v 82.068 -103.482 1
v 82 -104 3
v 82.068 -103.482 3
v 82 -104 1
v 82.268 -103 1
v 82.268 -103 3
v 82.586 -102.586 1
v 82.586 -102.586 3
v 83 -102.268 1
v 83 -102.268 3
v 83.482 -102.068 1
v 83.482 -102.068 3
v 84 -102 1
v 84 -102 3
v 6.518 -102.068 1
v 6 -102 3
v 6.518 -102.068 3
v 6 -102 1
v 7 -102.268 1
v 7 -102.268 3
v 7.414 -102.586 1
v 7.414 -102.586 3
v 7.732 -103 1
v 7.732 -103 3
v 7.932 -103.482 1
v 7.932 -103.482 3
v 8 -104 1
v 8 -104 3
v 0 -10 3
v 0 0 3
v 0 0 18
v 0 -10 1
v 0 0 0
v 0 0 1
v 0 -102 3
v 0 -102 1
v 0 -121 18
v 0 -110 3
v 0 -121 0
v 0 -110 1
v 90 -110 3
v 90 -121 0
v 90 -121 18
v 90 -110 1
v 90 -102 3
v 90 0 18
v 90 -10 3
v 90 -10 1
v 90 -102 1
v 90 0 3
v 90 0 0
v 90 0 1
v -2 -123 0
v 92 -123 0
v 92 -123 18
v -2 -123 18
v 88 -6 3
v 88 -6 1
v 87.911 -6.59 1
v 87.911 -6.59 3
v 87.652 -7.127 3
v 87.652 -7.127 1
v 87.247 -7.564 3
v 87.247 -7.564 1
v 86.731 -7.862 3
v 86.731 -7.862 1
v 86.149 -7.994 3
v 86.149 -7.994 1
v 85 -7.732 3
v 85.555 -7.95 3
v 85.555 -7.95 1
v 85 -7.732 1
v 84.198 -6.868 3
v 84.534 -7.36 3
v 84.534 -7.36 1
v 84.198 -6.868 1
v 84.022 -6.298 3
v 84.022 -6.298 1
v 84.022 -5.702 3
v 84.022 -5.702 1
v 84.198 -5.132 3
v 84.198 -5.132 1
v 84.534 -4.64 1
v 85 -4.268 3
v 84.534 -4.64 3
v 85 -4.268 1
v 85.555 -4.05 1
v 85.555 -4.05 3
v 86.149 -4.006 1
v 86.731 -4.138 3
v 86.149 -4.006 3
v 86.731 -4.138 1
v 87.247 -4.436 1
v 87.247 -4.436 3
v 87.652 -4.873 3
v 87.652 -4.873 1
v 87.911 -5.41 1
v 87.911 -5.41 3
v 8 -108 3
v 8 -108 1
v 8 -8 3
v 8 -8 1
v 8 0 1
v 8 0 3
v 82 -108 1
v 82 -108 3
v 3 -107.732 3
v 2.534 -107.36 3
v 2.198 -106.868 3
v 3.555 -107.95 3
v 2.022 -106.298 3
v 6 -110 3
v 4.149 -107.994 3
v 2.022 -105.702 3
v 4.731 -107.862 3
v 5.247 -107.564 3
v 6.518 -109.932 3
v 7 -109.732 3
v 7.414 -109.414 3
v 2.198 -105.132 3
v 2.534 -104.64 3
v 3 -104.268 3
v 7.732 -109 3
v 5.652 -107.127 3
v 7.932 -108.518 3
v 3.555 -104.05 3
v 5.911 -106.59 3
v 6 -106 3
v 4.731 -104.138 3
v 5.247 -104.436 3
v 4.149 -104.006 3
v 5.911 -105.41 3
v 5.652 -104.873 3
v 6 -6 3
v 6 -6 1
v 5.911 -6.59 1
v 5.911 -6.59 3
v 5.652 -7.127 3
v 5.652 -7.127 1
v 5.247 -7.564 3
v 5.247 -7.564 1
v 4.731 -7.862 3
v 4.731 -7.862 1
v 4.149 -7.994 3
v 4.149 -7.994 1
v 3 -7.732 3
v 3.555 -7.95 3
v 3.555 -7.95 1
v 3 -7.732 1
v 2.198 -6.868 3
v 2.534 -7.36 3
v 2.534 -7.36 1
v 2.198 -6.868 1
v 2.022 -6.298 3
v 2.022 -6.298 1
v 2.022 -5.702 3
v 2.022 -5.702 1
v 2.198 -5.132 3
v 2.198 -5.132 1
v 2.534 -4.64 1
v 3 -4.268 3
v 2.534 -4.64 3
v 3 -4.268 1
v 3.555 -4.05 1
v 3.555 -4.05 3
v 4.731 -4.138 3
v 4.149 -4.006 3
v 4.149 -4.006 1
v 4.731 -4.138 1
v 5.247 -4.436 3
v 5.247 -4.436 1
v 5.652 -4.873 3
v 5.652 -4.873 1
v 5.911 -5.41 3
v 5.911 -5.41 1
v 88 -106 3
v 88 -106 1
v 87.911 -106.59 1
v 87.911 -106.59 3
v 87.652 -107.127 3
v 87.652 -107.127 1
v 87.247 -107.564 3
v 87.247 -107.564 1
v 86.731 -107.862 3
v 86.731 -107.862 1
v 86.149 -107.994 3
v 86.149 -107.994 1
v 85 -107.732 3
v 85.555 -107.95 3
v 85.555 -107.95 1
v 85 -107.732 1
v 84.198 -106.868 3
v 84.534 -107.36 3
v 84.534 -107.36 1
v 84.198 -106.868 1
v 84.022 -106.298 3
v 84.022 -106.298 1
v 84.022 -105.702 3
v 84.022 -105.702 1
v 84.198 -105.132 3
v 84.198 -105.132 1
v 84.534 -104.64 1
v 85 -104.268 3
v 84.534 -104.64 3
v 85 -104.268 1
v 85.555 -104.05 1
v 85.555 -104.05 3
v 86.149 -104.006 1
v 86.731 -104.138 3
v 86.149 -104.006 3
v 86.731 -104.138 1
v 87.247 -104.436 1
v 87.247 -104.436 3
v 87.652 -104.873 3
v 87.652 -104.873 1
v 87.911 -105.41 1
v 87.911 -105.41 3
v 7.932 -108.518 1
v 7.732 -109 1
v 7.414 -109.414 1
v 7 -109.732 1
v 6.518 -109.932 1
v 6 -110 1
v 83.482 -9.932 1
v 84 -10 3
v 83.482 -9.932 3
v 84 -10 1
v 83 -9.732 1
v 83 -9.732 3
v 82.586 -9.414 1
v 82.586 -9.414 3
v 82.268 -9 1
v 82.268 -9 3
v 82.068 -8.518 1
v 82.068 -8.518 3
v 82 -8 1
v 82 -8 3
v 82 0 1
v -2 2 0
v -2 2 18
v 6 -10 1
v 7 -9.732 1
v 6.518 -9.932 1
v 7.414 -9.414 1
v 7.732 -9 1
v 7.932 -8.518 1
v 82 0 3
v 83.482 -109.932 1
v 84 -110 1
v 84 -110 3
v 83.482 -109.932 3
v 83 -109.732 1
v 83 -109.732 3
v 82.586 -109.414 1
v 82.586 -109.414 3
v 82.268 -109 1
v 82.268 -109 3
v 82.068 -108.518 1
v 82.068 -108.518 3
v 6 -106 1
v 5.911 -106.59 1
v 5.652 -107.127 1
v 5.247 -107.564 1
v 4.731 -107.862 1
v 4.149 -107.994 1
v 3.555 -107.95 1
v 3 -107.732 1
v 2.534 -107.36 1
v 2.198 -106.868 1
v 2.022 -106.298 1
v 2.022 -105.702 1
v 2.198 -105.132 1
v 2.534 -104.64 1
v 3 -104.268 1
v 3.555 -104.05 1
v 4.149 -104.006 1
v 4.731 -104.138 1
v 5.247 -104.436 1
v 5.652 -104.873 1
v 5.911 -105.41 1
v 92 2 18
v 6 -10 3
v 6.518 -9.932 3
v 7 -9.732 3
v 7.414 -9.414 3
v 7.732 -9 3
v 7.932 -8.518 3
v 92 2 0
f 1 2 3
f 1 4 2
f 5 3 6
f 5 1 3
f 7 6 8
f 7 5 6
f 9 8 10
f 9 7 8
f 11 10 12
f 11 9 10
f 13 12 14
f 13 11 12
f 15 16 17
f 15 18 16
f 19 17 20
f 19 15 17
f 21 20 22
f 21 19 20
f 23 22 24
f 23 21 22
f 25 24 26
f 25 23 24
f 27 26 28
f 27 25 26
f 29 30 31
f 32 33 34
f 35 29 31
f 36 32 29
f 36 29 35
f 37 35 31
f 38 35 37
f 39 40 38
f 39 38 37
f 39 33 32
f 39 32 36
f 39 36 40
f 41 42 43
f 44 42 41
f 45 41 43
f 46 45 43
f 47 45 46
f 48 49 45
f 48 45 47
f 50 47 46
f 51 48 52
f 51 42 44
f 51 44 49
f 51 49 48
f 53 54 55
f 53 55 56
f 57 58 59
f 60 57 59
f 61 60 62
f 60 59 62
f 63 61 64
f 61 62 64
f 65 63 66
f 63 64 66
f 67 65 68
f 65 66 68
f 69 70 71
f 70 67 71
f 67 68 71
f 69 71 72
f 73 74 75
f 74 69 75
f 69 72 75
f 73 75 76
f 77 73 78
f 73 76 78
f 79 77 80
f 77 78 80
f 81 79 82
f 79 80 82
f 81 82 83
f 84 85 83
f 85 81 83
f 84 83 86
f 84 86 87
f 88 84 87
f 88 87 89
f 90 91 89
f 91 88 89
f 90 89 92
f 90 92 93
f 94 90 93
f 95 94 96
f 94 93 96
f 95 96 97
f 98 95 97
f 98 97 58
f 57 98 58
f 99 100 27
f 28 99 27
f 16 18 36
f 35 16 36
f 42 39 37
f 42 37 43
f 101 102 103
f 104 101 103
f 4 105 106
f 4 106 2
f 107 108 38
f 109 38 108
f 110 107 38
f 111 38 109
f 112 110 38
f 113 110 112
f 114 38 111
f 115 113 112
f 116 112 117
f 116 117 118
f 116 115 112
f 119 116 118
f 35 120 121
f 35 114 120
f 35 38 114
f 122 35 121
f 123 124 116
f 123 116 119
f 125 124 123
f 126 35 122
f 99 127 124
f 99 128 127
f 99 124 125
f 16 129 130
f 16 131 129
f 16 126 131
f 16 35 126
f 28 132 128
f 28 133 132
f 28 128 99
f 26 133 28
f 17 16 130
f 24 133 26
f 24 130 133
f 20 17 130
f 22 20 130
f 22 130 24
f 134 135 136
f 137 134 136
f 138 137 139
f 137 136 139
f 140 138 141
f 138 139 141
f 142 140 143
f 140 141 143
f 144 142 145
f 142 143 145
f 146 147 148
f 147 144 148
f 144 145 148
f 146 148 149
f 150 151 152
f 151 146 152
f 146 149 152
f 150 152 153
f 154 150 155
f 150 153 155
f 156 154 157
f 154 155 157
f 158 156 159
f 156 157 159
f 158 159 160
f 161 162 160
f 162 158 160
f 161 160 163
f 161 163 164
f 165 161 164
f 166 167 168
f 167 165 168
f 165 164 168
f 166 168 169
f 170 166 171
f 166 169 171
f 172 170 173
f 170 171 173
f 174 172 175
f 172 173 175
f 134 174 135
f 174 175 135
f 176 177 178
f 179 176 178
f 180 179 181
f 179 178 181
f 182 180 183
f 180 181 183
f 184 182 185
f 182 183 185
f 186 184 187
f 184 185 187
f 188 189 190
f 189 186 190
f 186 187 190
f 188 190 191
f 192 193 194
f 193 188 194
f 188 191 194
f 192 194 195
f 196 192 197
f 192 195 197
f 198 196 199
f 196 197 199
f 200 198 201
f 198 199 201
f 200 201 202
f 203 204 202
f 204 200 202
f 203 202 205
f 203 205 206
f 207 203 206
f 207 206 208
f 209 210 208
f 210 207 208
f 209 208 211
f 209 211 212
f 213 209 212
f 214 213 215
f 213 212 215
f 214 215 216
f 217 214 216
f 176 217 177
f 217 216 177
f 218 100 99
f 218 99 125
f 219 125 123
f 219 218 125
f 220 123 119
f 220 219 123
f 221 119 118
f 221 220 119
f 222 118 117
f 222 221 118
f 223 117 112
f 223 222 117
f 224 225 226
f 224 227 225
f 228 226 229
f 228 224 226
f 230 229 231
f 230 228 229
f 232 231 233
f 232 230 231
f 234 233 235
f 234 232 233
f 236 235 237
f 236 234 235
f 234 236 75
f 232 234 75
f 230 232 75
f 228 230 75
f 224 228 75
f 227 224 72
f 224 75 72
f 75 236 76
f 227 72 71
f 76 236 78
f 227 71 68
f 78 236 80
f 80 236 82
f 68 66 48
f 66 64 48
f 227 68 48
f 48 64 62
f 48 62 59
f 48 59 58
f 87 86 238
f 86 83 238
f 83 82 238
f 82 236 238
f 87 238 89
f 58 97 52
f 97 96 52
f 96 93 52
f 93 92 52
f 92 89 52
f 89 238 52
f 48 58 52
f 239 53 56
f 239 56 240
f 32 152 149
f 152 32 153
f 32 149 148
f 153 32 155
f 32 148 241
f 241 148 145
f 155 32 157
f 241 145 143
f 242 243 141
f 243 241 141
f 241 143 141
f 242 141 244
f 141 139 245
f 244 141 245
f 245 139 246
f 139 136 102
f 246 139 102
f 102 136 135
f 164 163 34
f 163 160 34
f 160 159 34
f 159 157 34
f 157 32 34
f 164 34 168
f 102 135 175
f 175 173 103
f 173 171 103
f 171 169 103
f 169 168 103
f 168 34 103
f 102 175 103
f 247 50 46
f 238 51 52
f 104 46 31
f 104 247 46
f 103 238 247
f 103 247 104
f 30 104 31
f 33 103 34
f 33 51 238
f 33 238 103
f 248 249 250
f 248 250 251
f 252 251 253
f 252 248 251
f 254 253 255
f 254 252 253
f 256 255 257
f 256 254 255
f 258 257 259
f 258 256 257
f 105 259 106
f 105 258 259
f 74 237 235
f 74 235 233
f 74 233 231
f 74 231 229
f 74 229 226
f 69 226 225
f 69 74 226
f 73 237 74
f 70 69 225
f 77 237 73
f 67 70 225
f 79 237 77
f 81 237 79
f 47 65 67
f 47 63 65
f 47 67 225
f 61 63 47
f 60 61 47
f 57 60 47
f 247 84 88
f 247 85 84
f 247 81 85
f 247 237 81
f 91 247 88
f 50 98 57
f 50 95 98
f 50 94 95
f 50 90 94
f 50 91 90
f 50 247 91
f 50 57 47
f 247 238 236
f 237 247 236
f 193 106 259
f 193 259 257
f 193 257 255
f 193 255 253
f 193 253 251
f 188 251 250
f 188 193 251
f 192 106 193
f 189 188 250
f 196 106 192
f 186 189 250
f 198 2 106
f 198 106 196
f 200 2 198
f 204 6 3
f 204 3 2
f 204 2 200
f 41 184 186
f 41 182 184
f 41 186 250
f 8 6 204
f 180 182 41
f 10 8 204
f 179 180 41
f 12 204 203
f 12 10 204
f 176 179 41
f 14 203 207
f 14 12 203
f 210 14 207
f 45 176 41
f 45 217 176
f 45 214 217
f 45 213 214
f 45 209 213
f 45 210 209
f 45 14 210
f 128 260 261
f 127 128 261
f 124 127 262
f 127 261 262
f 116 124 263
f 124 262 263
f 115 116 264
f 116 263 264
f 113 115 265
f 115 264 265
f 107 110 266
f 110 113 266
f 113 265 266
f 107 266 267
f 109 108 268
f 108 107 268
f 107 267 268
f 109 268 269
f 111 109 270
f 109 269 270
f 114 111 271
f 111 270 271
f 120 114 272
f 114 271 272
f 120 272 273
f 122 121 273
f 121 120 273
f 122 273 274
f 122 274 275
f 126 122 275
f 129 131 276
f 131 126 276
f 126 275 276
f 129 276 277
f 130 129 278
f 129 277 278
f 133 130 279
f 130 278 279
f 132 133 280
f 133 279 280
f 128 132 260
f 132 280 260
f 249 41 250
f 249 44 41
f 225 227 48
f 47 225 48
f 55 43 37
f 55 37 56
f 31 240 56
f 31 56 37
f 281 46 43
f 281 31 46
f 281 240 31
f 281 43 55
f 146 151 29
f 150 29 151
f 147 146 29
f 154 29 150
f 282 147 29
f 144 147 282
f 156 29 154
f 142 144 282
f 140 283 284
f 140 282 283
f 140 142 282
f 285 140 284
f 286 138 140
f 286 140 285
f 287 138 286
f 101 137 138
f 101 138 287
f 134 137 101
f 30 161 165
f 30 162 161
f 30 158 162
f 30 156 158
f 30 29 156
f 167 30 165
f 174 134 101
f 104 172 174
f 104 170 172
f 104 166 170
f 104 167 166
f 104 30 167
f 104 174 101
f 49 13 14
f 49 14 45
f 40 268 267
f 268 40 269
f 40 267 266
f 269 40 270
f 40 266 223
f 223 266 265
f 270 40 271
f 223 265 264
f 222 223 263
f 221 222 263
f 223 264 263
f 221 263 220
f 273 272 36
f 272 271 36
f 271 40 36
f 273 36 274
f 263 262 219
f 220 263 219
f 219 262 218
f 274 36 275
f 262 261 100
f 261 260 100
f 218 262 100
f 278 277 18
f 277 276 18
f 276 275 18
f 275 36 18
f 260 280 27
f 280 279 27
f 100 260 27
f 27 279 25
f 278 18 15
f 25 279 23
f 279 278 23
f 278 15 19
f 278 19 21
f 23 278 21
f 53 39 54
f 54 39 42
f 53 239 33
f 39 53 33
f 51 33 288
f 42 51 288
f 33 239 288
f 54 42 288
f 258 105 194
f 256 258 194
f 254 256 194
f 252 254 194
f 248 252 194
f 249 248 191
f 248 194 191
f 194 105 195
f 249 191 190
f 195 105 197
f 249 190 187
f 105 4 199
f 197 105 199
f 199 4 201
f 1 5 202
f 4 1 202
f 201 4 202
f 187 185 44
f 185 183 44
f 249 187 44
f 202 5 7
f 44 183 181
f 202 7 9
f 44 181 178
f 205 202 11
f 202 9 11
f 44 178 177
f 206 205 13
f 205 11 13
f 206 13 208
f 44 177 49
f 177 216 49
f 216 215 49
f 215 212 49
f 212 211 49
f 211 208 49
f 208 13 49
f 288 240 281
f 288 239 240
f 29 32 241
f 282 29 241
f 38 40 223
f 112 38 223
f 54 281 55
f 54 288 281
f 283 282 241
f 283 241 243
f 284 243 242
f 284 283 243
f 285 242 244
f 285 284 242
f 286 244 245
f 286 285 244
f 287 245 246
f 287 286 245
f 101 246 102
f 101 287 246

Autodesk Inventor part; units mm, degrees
ref_plane "YZ Plane" through (0, 0, 0) normal (1, 0, 0) x (0, 1, 0)
ref_plane "XZ Plane" through (0, 0, 0) normal (0, 1, 0) x (-1, 0, 0)
ref_plane "XY Plane" through (0, 0, 0) normal (0, 0, 1) x (1, 0, 0)
sketch "Schizzo1" plane through (0, 0, 0) normal (0, 0, 1) x (1, 0, 0)
  point P0 (0, 0)
sketch "Schizzo2" plane through (0, 0, 0) normal (0, 0, 1) x (1, 0, 0)
  line L0 (0, -121) -> (90, -121) projected
  line L1 (90, -121) -> (90, 0) projected
  line L2 (0, 0) -> (0, -121) projected
  line L3 (90, 0) -> (0, 0) projected
  circle A0 centre (86, -106) radius 2 projected
  circle A1 centre (4, -106) radius 2 projected
  circle A2 centre (4, -6) radius 2 projected
  circle A3 centre (86, -6) radius 2 projected
  line L4 (92, 2) -> (92, -123)
  line L5 (92, -123) -> (-2, -123)
  line L6 (-2, -123) -> (-2, 2)
  line L7 (-2, 2) -> (92, 2)
  dimension "d0" = 2
extrude "Estrusione1" add sketch "Schizzo2" along normal blind 18 contours L4 L5 L6 L7
ref_plane "Piano di lavoro1" through (45, -60.5, 1) normal (0, 0, 1) x (1, 0, 0)
sketch "Schizzo3" plane through (45, -60.5, 1) normal (0, 0, 1) x (1, 0, 0)
  circle A0 centre (41, -45.5) radius 2 projected
  circle A1 centre (-41, -45.5) radius 2 projected
  circle A2 centre (41, 54.5) radius 2 projected
  circle A3 centre (-41, 54.5) radius 2 projected
  line L0 (45, -60.5) -> (45, 60.5) projected
  line L1 (45, 60.5) -> (-45, 60.5) projected
  line L2 (-45, -60.5) -> (45, -60.5) projected
  line L3 (-45, 60.5) -> (-45, -60.5) projected
  line L4 (-45, -60.5) -> (-45, 60.5) projected
  line L5 (-39, -41.5) -> (-45, -41.5)
  line L6 (-45, -41.5) -> (-45, -49.5)
  line L7 (-45, -49.5) -> (-39, -49.5)
  line L8 (-37, -47.5) -> (-37, -43.5)
  arc A4 (-37, -43.5) -> (-39, -41.5) centre (-39, -43.5) ccw
  arc A5 (-39, -49.5) -> (-37, -47.5) centre (-39, -47.5) ccw
  line L9 (39, -41.5) -> (45, -41.5)
  line L10 (45, -41.5) -> (45, -49.5)
  line L11 (45, -49.5) -> (39, -49.5)
  line L12 (37, -47.5) -> (37, -43.5)
  arc A6 (37, -47.5) -> (39, -49.5) centre (39, -47.5) ccw
  arc A7 (39, -41.5) -> (37, -43.5) centre (39, -43.5) ccw
  line L13 (37, 60.5) -> (37, 52.5)
  line L14 (39, 50.5) -> (45, 50.5)
  line L15 (45, 50.5) -> (45, 60.5)
  arc A8 (37, 52.5) -> (39, 50.5) centre (39, 52.5) ccw
  line L16 (-45, 60.5) -> (-45, 50.5)
  line L17 (-45, 50.5) -> (-37, 50.5)
  line L18 (-37, 50.5) -> (-37, 60.5)
  point P0 (-45, -41.5)
  point P1 (-45, -49.5)
  point P2 (45, 50.5)
extrude "Estrusione2" add sketch "Schizzo3" along normal blind 2 contours L11 A6 L12 A7 L9 L0 | L3 L5 A4 L8 A5 L7 | L14 A8 L13 L1 L0 | L3 L1 L18 L17
fillet "Raccordo1" radius 2 1 edges at (8, -10, 2)
properties part number "Struttura" material "Plastica ABS"
